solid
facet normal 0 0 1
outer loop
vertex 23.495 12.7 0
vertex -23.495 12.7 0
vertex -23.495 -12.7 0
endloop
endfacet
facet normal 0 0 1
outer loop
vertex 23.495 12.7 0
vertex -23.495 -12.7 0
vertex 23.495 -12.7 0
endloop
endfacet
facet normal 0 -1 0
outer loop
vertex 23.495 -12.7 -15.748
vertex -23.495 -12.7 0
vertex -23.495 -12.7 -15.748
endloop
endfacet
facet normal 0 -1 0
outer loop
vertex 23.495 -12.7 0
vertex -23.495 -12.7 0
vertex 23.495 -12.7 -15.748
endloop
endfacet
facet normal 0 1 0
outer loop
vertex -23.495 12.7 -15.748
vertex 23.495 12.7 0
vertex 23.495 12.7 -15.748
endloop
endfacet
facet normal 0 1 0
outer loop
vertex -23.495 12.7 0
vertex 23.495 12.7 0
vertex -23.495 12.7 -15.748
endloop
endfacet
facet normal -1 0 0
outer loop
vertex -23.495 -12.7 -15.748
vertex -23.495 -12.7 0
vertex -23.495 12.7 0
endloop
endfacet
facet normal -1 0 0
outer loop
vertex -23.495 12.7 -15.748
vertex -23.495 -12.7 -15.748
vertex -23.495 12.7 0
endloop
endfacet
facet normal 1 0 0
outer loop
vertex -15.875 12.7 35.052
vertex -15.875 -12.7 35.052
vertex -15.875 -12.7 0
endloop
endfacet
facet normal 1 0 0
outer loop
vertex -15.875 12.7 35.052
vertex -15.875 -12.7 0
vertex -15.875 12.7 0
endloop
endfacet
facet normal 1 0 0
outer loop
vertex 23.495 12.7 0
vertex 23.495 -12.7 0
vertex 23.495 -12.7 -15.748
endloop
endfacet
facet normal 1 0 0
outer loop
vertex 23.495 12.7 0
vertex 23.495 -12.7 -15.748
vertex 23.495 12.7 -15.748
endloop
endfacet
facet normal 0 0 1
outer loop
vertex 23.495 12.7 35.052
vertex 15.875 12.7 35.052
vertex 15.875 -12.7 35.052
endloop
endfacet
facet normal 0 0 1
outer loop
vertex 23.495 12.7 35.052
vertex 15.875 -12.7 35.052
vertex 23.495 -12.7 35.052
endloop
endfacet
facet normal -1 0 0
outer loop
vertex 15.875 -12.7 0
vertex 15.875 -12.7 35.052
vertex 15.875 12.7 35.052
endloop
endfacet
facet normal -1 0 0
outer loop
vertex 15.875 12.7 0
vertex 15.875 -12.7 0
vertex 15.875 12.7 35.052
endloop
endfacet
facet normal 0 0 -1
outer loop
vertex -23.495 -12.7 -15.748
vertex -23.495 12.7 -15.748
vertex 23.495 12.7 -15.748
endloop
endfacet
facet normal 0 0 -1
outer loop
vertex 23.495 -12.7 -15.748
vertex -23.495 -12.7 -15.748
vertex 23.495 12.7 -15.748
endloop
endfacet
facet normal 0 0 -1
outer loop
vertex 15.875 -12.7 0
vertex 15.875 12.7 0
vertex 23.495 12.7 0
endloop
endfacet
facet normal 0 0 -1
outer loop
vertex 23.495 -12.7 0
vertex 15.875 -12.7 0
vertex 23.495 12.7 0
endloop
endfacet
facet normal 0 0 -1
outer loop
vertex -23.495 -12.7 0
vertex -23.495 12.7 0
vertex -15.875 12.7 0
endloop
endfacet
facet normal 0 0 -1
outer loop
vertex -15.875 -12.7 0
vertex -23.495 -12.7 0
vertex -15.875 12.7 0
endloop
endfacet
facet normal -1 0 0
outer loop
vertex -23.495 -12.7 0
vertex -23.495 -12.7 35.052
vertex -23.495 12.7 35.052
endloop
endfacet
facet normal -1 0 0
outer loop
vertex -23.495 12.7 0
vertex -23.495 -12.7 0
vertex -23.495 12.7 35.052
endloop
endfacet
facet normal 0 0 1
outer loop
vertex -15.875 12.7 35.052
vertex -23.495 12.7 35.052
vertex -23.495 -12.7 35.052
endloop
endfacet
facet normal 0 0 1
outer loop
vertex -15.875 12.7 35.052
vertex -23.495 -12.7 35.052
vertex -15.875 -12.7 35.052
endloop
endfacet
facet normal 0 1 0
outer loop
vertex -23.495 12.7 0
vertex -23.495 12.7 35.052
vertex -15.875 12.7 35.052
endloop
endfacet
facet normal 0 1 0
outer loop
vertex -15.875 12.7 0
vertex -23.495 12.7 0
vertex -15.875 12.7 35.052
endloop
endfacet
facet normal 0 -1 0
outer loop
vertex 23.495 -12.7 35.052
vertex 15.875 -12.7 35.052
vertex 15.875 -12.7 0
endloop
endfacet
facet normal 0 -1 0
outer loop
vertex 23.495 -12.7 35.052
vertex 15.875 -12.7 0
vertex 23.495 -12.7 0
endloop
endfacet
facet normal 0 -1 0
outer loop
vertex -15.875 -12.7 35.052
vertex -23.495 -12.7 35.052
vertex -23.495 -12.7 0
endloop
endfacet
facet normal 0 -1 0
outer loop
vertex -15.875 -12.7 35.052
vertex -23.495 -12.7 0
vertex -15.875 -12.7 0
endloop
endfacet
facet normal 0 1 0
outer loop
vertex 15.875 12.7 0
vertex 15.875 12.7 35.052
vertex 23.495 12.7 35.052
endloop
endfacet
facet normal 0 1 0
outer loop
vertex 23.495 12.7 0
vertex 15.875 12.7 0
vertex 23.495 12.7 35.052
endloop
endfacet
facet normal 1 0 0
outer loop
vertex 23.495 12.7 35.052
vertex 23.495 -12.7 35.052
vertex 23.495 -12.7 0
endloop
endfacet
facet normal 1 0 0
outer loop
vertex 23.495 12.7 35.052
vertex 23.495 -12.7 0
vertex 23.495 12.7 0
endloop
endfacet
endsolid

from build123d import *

# Parameters (mm, degrees)
F0_W     = 7.62
F0_H     = 25.4
F1_DEPTH = 35.052
F0_W_2   = 31.75
F2_DEPTH = 15.748


with BuildPart() as f1:
    # F0 (on Top) → F1 (new body)
    with BuildSketch(Plane.XY):
        with Locations((-19.685, 0)):
            Rectangle(F0_W, F0_H)
        with Locations((19.685, 0)):
            Rectangle(F0_W, F0_H)
    extrude(amount=F1_DEPTH)


with BuildPart() as f2:
    # F0 (on Top) → F2 (new body)
    with BuildSketch(Plane.XY):
        with Locations((-19.685, 0)):
            Rectangle(F0_W, F0_H)
        with Locations((19.685, 0)):
            Rectangle(F0_W, F0_H)
        Rectangle(F0_W_2, F0_H)
    extrude(amount=-F2_DEPTH)


solid = Compound([f1.part, f2.part])
